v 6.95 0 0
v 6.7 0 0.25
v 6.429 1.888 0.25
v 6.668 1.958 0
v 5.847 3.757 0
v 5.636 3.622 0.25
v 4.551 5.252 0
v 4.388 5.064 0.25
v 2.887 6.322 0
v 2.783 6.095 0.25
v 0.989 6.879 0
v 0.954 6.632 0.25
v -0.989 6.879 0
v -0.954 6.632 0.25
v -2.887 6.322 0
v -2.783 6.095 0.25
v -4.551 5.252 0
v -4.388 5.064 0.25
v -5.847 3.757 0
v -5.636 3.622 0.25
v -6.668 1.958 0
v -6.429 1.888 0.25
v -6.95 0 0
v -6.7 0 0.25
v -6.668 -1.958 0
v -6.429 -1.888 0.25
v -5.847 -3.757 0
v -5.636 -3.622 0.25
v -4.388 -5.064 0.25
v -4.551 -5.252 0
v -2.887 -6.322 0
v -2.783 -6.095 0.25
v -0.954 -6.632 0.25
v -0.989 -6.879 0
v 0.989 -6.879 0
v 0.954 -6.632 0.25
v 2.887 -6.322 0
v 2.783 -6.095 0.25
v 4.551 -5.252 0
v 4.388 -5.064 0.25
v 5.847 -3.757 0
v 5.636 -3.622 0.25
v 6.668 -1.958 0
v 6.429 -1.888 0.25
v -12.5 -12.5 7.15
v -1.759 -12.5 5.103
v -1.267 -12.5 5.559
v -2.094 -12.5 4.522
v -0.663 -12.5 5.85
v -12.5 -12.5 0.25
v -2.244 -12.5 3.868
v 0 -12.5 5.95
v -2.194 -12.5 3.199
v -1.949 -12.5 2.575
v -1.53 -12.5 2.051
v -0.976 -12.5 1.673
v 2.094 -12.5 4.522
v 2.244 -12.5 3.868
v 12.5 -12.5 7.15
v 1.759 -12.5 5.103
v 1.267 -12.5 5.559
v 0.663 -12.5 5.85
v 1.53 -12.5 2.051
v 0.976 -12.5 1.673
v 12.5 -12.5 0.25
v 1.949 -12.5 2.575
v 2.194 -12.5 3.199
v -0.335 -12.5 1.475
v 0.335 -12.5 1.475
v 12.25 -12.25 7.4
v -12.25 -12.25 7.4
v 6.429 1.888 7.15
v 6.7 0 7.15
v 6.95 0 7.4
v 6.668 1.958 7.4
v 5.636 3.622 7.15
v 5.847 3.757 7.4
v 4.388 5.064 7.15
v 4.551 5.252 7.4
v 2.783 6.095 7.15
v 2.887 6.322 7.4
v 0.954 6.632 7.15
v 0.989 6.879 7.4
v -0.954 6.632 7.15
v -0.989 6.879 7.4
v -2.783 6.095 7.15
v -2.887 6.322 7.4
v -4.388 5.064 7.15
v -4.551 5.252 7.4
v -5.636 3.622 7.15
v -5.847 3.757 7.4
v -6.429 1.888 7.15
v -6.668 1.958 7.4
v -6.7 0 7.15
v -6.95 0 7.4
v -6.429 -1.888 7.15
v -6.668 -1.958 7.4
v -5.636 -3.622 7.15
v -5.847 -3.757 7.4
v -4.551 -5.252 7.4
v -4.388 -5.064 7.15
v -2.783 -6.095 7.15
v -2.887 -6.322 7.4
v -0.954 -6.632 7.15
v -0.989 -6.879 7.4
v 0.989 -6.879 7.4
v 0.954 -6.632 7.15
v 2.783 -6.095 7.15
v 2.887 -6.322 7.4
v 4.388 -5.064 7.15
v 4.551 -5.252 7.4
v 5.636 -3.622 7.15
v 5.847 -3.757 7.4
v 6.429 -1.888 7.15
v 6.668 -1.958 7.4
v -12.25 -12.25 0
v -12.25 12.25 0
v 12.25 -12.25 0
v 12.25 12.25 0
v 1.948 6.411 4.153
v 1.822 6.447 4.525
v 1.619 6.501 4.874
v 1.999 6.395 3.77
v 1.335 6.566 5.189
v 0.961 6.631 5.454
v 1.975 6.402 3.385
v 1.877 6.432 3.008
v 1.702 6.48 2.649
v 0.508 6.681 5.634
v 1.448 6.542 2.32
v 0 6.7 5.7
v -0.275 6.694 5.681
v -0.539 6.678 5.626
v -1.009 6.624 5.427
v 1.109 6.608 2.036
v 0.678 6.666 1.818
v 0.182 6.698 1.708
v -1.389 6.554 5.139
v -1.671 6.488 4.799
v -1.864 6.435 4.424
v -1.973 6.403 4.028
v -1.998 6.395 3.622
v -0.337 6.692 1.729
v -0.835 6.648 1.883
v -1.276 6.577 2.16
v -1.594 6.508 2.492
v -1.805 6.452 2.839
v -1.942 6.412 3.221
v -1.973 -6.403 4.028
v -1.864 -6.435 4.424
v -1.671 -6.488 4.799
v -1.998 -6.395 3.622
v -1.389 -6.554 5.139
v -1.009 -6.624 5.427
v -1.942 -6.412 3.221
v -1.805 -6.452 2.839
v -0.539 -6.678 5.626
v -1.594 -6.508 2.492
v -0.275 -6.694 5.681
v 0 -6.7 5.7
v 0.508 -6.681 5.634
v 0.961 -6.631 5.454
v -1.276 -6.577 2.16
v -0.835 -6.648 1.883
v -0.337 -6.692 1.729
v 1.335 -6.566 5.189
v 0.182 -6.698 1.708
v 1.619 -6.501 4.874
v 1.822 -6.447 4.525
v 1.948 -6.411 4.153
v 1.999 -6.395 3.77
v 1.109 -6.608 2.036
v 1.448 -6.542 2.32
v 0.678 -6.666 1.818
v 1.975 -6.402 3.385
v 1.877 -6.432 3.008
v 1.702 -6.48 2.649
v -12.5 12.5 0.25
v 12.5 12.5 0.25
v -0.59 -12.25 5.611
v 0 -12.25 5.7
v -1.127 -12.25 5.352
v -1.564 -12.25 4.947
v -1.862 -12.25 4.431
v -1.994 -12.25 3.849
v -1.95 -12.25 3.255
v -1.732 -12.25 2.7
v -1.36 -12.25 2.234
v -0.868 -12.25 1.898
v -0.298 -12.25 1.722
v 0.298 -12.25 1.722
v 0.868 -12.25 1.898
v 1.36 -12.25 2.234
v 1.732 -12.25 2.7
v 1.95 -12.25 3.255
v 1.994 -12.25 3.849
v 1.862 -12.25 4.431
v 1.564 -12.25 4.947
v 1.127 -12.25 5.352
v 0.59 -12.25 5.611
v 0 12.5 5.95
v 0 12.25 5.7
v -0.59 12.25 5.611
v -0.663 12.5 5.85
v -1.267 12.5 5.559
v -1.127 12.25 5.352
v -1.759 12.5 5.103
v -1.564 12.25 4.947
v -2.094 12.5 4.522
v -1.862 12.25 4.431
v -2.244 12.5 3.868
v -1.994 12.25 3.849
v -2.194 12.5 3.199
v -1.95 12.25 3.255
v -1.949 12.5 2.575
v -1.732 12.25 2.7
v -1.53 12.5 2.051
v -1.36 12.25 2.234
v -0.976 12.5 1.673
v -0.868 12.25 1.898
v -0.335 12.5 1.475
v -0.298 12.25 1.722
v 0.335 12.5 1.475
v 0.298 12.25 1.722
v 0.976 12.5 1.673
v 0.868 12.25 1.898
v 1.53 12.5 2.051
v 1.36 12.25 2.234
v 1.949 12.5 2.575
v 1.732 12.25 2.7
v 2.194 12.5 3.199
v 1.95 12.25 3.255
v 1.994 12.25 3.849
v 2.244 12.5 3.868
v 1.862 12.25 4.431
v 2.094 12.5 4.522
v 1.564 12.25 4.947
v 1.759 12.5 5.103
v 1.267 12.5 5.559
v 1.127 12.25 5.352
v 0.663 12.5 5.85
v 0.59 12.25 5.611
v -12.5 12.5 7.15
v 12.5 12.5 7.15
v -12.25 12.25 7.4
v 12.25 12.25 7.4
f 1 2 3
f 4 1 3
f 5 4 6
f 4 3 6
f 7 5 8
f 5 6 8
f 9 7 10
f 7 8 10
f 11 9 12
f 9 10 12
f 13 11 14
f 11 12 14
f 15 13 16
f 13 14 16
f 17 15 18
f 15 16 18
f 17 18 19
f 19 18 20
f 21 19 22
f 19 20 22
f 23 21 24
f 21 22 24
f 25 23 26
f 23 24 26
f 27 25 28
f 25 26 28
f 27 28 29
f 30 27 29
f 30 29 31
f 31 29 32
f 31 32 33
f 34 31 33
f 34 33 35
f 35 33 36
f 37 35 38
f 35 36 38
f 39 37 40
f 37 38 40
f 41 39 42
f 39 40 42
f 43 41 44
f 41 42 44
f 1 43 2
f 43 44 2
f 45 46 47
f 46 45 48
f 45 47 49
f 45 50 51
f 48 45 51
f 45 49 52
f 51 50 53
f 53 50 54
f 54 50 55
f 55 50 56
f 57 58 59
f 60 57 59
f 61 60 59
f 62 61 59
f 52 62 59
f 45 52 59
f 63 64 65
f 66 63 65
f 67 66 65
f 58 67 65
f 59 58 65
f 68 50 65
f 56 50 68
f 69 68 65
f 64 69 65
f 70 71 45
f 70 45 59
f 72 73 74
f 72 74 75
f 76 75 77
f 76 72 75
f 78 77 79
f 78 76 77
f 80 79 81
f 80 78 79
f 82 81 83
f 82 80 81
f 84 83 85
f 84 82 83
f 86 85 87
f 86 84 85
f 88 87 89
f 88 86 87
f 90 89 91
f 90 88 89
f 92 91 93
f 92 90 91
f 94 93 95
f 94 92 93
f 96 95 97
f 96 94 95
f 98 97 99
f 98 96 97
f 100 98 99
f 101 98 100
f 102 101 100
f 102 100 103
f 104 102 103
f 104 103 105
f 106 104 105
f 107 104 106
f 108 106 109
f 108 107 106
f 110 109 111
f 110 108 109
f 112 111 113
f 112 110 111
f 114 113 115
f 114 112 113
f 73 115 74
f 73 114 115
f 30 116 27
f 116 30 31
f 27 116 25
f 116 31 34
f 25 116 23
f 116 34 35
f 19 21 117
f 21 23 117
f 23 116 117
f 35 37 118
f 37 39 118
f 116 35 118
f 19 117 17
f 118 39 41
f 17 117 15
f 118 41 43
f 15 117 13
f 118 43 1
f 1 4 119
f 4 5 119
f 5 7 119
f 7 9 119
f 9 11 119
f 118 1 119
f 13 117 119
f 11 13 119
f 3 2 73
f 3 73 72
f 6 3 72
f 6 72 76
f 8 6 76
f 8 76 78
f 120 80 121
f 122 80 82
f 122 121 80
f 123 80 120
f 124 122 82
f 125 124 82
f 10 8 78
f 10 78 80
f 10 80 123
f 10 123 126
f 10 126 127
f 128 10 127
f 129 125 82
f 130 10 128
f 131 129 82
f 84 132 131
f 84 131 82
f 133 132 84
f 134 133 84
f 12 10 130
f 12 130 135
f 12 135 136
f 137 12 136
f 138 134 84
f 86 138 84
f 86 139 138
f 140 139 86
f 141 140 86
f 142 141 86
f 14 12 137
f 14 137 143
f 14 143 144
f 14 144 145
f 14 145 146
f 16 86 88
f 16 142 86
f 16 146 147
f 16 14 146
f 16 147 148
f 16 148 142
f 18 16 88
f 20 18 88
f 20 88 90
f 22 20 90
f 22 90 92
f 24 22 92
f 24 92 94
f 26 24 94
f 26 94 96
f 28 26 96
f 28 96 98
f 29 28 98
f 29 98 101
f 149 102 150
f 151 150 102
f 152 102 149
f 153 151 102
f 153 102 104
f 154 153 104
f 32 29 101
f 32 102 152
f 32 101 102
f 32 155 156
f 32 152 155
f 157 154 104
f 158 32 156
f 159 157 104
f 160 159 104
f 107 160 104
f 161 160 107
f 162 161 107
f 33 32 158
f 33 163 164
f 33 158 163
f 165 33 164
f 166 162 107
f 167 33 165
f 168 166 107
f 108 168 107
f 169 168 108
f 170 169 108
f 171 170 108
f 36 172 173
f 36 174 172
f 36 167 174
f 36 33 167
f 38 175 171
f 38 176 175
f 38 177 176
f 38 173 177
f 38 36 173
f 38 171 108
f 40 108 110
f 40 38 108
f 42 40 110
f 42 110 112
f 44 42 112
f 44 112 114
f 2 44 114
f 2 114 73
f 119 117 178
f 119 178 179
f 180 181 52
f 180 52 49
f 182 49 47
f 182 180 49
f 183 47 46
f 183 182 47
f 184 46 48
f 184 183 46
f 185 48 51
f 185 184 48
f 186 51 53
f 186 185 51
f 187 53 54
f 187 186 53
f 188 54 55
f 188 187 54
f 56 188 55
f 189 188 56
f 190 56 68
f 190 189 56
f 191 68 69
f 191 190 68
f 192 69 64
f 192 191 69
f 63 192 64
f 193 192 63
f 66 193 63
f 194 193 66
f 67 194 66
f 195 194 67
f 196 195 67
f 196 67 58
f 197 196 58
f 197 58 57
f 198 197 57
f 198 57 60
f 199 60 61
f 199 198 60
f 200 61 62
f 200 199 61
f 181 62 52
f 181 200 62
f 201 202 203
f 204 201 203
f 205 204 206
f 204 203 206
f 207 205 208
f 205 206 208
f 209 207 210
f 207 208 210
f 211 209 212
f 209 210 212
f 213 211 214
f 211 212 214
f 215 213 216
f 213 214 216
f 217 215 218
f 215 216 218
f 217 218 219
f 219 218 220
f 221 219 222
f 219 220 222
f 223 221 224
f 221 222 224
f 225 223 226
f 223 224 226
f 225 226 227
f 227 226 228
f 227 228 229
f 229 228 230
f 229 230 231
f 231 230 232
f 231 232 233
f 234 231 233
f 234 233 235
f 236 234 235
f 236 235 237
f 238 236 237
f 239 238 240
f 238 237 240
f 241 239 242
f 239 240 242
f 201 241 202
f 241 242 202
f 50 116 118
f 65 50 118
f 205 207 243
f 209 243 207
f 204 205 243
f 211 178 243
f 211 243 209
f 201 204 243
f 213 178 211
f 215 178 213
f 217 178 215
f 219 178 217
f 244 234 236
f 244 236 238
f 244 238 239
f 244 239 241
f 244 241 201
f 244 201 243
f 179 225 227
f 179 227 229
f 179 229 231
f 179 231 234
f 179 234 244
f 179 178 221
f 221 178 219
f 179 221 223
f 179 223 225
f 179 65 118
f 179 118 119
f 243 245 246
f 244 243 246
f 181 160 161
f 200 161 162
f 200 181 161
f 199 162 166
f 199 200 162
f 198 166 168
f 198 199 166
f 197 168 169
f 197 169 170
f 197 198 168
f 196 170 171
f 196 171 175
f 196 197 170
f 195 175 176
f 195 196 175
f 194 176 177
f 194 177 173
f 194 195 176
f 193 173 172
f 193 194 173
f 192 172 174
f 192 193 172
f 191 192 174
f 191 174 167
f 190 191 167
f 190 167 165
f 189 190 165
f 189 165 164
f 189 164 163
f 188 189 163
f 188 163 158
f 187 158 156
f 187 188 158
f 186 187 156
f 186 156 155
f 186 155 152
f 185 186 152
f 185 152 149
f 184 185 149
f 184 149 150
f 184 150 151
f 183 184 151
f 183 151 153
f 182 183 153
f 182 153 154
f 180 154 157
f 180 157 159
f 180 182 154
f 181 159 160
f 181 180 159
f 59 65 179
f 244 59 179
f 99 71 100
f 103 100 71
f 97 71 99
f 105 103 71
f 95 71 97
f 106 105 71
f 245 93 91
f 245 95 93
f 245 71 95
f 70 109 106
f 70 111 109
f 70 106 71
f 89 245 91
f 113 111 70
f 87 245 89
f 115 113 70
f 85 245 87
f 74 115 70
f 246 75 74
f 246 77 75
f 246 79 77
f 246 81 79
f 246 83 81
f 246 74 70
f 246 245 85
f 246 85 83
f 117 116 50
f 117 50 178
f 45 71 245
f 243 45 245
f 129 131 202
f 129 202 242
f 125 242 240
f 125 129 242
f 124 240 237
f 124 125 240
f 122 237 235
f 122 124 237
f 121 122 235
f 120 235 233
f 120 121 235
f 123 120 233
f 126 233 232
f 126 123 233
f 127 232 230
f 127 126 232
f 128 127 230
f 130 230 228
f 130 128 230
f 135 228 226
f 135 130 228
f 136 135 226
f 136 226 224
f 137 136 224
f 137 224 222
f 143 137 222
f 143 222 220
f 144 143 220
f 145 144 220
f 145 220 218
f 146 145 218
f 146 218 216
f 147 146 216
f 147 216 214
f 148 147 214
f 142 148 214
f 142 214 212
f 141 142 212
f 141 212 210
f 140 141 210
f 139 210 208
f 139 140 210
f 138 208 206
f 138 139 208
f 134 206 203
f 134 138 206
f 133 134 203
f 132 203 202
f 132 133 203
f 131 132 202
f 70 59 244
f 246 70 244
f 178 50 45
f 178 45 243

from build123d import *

# Parameters (mm, degrees)
SKETCH1_W               = 25
SKETCH1_H               = 25
SKETCH1_R               = 6.7
BOSS_EXTRUDE1_DEPTH     = 7.4
CUT_EXTRUDE1_DEPTH      = 20.164028804
CUT_EXTRUDE1_DEPTH_BACK = 20.164028804
SKETCH2_R               = 2
CHAMFER1_SIZE           = 0.25


with BuildPart() as part:
    # Sketch1 → Boss-Extrude1 (new body)
    with BuildSketch(Plane.XY):
        Rectangle(SKETCH1_W, SKETCH1_H)
        Circle(SKETCH1_R, mode=Mode.SUBTRACT)
    extrude(amount=BOSS_EXTRUDE1_DEPTH)

    # Sketch2 → Cut-Extrude1 (cut, two sides: drawn at the far end of the back side and taken through both)
    with BuildSketch(Plane(origin=(0, 0, 0), x_dir=(1, 0, 0), z_dir=(0, 1, 0)).offset(-CUT_EXTRUDE1_DEPTH_BACK)):
        with Locations(Location((0, -3.7, 0), (0, 0, 270))):
            Circle(SKETCH2_R)
    extrude(amount=CUT_EXTRUDE1_DEPTH + CUT_EXTRUDE1_DEPTH_BACK, mode=Mode.SUBTRACT)

    # Chamfer1
    chamfer1_edges = [part.edges().sort_by_distance(p)[0] for p in [
        (-6.7, 0, 0),
        (-6.7, 0, 7.4),
        (-12.5, 0, 7.4),
        (0, -12.5, 7.4),
        (0, -12.5, 1.7),
        (0, 12.5, 1.7),
        (12.5, 0, 7.4),
        (0, -12.5, 0),
        (-12.5, 0, 0),
        (0, 12.5, 0),
        (12.5, 0, 0),
        (0, 12.5, 7.4),
    ]]
    chamfer(chamfer1_edges, length=CHAMFER1_SIZE)


solid = part.part
